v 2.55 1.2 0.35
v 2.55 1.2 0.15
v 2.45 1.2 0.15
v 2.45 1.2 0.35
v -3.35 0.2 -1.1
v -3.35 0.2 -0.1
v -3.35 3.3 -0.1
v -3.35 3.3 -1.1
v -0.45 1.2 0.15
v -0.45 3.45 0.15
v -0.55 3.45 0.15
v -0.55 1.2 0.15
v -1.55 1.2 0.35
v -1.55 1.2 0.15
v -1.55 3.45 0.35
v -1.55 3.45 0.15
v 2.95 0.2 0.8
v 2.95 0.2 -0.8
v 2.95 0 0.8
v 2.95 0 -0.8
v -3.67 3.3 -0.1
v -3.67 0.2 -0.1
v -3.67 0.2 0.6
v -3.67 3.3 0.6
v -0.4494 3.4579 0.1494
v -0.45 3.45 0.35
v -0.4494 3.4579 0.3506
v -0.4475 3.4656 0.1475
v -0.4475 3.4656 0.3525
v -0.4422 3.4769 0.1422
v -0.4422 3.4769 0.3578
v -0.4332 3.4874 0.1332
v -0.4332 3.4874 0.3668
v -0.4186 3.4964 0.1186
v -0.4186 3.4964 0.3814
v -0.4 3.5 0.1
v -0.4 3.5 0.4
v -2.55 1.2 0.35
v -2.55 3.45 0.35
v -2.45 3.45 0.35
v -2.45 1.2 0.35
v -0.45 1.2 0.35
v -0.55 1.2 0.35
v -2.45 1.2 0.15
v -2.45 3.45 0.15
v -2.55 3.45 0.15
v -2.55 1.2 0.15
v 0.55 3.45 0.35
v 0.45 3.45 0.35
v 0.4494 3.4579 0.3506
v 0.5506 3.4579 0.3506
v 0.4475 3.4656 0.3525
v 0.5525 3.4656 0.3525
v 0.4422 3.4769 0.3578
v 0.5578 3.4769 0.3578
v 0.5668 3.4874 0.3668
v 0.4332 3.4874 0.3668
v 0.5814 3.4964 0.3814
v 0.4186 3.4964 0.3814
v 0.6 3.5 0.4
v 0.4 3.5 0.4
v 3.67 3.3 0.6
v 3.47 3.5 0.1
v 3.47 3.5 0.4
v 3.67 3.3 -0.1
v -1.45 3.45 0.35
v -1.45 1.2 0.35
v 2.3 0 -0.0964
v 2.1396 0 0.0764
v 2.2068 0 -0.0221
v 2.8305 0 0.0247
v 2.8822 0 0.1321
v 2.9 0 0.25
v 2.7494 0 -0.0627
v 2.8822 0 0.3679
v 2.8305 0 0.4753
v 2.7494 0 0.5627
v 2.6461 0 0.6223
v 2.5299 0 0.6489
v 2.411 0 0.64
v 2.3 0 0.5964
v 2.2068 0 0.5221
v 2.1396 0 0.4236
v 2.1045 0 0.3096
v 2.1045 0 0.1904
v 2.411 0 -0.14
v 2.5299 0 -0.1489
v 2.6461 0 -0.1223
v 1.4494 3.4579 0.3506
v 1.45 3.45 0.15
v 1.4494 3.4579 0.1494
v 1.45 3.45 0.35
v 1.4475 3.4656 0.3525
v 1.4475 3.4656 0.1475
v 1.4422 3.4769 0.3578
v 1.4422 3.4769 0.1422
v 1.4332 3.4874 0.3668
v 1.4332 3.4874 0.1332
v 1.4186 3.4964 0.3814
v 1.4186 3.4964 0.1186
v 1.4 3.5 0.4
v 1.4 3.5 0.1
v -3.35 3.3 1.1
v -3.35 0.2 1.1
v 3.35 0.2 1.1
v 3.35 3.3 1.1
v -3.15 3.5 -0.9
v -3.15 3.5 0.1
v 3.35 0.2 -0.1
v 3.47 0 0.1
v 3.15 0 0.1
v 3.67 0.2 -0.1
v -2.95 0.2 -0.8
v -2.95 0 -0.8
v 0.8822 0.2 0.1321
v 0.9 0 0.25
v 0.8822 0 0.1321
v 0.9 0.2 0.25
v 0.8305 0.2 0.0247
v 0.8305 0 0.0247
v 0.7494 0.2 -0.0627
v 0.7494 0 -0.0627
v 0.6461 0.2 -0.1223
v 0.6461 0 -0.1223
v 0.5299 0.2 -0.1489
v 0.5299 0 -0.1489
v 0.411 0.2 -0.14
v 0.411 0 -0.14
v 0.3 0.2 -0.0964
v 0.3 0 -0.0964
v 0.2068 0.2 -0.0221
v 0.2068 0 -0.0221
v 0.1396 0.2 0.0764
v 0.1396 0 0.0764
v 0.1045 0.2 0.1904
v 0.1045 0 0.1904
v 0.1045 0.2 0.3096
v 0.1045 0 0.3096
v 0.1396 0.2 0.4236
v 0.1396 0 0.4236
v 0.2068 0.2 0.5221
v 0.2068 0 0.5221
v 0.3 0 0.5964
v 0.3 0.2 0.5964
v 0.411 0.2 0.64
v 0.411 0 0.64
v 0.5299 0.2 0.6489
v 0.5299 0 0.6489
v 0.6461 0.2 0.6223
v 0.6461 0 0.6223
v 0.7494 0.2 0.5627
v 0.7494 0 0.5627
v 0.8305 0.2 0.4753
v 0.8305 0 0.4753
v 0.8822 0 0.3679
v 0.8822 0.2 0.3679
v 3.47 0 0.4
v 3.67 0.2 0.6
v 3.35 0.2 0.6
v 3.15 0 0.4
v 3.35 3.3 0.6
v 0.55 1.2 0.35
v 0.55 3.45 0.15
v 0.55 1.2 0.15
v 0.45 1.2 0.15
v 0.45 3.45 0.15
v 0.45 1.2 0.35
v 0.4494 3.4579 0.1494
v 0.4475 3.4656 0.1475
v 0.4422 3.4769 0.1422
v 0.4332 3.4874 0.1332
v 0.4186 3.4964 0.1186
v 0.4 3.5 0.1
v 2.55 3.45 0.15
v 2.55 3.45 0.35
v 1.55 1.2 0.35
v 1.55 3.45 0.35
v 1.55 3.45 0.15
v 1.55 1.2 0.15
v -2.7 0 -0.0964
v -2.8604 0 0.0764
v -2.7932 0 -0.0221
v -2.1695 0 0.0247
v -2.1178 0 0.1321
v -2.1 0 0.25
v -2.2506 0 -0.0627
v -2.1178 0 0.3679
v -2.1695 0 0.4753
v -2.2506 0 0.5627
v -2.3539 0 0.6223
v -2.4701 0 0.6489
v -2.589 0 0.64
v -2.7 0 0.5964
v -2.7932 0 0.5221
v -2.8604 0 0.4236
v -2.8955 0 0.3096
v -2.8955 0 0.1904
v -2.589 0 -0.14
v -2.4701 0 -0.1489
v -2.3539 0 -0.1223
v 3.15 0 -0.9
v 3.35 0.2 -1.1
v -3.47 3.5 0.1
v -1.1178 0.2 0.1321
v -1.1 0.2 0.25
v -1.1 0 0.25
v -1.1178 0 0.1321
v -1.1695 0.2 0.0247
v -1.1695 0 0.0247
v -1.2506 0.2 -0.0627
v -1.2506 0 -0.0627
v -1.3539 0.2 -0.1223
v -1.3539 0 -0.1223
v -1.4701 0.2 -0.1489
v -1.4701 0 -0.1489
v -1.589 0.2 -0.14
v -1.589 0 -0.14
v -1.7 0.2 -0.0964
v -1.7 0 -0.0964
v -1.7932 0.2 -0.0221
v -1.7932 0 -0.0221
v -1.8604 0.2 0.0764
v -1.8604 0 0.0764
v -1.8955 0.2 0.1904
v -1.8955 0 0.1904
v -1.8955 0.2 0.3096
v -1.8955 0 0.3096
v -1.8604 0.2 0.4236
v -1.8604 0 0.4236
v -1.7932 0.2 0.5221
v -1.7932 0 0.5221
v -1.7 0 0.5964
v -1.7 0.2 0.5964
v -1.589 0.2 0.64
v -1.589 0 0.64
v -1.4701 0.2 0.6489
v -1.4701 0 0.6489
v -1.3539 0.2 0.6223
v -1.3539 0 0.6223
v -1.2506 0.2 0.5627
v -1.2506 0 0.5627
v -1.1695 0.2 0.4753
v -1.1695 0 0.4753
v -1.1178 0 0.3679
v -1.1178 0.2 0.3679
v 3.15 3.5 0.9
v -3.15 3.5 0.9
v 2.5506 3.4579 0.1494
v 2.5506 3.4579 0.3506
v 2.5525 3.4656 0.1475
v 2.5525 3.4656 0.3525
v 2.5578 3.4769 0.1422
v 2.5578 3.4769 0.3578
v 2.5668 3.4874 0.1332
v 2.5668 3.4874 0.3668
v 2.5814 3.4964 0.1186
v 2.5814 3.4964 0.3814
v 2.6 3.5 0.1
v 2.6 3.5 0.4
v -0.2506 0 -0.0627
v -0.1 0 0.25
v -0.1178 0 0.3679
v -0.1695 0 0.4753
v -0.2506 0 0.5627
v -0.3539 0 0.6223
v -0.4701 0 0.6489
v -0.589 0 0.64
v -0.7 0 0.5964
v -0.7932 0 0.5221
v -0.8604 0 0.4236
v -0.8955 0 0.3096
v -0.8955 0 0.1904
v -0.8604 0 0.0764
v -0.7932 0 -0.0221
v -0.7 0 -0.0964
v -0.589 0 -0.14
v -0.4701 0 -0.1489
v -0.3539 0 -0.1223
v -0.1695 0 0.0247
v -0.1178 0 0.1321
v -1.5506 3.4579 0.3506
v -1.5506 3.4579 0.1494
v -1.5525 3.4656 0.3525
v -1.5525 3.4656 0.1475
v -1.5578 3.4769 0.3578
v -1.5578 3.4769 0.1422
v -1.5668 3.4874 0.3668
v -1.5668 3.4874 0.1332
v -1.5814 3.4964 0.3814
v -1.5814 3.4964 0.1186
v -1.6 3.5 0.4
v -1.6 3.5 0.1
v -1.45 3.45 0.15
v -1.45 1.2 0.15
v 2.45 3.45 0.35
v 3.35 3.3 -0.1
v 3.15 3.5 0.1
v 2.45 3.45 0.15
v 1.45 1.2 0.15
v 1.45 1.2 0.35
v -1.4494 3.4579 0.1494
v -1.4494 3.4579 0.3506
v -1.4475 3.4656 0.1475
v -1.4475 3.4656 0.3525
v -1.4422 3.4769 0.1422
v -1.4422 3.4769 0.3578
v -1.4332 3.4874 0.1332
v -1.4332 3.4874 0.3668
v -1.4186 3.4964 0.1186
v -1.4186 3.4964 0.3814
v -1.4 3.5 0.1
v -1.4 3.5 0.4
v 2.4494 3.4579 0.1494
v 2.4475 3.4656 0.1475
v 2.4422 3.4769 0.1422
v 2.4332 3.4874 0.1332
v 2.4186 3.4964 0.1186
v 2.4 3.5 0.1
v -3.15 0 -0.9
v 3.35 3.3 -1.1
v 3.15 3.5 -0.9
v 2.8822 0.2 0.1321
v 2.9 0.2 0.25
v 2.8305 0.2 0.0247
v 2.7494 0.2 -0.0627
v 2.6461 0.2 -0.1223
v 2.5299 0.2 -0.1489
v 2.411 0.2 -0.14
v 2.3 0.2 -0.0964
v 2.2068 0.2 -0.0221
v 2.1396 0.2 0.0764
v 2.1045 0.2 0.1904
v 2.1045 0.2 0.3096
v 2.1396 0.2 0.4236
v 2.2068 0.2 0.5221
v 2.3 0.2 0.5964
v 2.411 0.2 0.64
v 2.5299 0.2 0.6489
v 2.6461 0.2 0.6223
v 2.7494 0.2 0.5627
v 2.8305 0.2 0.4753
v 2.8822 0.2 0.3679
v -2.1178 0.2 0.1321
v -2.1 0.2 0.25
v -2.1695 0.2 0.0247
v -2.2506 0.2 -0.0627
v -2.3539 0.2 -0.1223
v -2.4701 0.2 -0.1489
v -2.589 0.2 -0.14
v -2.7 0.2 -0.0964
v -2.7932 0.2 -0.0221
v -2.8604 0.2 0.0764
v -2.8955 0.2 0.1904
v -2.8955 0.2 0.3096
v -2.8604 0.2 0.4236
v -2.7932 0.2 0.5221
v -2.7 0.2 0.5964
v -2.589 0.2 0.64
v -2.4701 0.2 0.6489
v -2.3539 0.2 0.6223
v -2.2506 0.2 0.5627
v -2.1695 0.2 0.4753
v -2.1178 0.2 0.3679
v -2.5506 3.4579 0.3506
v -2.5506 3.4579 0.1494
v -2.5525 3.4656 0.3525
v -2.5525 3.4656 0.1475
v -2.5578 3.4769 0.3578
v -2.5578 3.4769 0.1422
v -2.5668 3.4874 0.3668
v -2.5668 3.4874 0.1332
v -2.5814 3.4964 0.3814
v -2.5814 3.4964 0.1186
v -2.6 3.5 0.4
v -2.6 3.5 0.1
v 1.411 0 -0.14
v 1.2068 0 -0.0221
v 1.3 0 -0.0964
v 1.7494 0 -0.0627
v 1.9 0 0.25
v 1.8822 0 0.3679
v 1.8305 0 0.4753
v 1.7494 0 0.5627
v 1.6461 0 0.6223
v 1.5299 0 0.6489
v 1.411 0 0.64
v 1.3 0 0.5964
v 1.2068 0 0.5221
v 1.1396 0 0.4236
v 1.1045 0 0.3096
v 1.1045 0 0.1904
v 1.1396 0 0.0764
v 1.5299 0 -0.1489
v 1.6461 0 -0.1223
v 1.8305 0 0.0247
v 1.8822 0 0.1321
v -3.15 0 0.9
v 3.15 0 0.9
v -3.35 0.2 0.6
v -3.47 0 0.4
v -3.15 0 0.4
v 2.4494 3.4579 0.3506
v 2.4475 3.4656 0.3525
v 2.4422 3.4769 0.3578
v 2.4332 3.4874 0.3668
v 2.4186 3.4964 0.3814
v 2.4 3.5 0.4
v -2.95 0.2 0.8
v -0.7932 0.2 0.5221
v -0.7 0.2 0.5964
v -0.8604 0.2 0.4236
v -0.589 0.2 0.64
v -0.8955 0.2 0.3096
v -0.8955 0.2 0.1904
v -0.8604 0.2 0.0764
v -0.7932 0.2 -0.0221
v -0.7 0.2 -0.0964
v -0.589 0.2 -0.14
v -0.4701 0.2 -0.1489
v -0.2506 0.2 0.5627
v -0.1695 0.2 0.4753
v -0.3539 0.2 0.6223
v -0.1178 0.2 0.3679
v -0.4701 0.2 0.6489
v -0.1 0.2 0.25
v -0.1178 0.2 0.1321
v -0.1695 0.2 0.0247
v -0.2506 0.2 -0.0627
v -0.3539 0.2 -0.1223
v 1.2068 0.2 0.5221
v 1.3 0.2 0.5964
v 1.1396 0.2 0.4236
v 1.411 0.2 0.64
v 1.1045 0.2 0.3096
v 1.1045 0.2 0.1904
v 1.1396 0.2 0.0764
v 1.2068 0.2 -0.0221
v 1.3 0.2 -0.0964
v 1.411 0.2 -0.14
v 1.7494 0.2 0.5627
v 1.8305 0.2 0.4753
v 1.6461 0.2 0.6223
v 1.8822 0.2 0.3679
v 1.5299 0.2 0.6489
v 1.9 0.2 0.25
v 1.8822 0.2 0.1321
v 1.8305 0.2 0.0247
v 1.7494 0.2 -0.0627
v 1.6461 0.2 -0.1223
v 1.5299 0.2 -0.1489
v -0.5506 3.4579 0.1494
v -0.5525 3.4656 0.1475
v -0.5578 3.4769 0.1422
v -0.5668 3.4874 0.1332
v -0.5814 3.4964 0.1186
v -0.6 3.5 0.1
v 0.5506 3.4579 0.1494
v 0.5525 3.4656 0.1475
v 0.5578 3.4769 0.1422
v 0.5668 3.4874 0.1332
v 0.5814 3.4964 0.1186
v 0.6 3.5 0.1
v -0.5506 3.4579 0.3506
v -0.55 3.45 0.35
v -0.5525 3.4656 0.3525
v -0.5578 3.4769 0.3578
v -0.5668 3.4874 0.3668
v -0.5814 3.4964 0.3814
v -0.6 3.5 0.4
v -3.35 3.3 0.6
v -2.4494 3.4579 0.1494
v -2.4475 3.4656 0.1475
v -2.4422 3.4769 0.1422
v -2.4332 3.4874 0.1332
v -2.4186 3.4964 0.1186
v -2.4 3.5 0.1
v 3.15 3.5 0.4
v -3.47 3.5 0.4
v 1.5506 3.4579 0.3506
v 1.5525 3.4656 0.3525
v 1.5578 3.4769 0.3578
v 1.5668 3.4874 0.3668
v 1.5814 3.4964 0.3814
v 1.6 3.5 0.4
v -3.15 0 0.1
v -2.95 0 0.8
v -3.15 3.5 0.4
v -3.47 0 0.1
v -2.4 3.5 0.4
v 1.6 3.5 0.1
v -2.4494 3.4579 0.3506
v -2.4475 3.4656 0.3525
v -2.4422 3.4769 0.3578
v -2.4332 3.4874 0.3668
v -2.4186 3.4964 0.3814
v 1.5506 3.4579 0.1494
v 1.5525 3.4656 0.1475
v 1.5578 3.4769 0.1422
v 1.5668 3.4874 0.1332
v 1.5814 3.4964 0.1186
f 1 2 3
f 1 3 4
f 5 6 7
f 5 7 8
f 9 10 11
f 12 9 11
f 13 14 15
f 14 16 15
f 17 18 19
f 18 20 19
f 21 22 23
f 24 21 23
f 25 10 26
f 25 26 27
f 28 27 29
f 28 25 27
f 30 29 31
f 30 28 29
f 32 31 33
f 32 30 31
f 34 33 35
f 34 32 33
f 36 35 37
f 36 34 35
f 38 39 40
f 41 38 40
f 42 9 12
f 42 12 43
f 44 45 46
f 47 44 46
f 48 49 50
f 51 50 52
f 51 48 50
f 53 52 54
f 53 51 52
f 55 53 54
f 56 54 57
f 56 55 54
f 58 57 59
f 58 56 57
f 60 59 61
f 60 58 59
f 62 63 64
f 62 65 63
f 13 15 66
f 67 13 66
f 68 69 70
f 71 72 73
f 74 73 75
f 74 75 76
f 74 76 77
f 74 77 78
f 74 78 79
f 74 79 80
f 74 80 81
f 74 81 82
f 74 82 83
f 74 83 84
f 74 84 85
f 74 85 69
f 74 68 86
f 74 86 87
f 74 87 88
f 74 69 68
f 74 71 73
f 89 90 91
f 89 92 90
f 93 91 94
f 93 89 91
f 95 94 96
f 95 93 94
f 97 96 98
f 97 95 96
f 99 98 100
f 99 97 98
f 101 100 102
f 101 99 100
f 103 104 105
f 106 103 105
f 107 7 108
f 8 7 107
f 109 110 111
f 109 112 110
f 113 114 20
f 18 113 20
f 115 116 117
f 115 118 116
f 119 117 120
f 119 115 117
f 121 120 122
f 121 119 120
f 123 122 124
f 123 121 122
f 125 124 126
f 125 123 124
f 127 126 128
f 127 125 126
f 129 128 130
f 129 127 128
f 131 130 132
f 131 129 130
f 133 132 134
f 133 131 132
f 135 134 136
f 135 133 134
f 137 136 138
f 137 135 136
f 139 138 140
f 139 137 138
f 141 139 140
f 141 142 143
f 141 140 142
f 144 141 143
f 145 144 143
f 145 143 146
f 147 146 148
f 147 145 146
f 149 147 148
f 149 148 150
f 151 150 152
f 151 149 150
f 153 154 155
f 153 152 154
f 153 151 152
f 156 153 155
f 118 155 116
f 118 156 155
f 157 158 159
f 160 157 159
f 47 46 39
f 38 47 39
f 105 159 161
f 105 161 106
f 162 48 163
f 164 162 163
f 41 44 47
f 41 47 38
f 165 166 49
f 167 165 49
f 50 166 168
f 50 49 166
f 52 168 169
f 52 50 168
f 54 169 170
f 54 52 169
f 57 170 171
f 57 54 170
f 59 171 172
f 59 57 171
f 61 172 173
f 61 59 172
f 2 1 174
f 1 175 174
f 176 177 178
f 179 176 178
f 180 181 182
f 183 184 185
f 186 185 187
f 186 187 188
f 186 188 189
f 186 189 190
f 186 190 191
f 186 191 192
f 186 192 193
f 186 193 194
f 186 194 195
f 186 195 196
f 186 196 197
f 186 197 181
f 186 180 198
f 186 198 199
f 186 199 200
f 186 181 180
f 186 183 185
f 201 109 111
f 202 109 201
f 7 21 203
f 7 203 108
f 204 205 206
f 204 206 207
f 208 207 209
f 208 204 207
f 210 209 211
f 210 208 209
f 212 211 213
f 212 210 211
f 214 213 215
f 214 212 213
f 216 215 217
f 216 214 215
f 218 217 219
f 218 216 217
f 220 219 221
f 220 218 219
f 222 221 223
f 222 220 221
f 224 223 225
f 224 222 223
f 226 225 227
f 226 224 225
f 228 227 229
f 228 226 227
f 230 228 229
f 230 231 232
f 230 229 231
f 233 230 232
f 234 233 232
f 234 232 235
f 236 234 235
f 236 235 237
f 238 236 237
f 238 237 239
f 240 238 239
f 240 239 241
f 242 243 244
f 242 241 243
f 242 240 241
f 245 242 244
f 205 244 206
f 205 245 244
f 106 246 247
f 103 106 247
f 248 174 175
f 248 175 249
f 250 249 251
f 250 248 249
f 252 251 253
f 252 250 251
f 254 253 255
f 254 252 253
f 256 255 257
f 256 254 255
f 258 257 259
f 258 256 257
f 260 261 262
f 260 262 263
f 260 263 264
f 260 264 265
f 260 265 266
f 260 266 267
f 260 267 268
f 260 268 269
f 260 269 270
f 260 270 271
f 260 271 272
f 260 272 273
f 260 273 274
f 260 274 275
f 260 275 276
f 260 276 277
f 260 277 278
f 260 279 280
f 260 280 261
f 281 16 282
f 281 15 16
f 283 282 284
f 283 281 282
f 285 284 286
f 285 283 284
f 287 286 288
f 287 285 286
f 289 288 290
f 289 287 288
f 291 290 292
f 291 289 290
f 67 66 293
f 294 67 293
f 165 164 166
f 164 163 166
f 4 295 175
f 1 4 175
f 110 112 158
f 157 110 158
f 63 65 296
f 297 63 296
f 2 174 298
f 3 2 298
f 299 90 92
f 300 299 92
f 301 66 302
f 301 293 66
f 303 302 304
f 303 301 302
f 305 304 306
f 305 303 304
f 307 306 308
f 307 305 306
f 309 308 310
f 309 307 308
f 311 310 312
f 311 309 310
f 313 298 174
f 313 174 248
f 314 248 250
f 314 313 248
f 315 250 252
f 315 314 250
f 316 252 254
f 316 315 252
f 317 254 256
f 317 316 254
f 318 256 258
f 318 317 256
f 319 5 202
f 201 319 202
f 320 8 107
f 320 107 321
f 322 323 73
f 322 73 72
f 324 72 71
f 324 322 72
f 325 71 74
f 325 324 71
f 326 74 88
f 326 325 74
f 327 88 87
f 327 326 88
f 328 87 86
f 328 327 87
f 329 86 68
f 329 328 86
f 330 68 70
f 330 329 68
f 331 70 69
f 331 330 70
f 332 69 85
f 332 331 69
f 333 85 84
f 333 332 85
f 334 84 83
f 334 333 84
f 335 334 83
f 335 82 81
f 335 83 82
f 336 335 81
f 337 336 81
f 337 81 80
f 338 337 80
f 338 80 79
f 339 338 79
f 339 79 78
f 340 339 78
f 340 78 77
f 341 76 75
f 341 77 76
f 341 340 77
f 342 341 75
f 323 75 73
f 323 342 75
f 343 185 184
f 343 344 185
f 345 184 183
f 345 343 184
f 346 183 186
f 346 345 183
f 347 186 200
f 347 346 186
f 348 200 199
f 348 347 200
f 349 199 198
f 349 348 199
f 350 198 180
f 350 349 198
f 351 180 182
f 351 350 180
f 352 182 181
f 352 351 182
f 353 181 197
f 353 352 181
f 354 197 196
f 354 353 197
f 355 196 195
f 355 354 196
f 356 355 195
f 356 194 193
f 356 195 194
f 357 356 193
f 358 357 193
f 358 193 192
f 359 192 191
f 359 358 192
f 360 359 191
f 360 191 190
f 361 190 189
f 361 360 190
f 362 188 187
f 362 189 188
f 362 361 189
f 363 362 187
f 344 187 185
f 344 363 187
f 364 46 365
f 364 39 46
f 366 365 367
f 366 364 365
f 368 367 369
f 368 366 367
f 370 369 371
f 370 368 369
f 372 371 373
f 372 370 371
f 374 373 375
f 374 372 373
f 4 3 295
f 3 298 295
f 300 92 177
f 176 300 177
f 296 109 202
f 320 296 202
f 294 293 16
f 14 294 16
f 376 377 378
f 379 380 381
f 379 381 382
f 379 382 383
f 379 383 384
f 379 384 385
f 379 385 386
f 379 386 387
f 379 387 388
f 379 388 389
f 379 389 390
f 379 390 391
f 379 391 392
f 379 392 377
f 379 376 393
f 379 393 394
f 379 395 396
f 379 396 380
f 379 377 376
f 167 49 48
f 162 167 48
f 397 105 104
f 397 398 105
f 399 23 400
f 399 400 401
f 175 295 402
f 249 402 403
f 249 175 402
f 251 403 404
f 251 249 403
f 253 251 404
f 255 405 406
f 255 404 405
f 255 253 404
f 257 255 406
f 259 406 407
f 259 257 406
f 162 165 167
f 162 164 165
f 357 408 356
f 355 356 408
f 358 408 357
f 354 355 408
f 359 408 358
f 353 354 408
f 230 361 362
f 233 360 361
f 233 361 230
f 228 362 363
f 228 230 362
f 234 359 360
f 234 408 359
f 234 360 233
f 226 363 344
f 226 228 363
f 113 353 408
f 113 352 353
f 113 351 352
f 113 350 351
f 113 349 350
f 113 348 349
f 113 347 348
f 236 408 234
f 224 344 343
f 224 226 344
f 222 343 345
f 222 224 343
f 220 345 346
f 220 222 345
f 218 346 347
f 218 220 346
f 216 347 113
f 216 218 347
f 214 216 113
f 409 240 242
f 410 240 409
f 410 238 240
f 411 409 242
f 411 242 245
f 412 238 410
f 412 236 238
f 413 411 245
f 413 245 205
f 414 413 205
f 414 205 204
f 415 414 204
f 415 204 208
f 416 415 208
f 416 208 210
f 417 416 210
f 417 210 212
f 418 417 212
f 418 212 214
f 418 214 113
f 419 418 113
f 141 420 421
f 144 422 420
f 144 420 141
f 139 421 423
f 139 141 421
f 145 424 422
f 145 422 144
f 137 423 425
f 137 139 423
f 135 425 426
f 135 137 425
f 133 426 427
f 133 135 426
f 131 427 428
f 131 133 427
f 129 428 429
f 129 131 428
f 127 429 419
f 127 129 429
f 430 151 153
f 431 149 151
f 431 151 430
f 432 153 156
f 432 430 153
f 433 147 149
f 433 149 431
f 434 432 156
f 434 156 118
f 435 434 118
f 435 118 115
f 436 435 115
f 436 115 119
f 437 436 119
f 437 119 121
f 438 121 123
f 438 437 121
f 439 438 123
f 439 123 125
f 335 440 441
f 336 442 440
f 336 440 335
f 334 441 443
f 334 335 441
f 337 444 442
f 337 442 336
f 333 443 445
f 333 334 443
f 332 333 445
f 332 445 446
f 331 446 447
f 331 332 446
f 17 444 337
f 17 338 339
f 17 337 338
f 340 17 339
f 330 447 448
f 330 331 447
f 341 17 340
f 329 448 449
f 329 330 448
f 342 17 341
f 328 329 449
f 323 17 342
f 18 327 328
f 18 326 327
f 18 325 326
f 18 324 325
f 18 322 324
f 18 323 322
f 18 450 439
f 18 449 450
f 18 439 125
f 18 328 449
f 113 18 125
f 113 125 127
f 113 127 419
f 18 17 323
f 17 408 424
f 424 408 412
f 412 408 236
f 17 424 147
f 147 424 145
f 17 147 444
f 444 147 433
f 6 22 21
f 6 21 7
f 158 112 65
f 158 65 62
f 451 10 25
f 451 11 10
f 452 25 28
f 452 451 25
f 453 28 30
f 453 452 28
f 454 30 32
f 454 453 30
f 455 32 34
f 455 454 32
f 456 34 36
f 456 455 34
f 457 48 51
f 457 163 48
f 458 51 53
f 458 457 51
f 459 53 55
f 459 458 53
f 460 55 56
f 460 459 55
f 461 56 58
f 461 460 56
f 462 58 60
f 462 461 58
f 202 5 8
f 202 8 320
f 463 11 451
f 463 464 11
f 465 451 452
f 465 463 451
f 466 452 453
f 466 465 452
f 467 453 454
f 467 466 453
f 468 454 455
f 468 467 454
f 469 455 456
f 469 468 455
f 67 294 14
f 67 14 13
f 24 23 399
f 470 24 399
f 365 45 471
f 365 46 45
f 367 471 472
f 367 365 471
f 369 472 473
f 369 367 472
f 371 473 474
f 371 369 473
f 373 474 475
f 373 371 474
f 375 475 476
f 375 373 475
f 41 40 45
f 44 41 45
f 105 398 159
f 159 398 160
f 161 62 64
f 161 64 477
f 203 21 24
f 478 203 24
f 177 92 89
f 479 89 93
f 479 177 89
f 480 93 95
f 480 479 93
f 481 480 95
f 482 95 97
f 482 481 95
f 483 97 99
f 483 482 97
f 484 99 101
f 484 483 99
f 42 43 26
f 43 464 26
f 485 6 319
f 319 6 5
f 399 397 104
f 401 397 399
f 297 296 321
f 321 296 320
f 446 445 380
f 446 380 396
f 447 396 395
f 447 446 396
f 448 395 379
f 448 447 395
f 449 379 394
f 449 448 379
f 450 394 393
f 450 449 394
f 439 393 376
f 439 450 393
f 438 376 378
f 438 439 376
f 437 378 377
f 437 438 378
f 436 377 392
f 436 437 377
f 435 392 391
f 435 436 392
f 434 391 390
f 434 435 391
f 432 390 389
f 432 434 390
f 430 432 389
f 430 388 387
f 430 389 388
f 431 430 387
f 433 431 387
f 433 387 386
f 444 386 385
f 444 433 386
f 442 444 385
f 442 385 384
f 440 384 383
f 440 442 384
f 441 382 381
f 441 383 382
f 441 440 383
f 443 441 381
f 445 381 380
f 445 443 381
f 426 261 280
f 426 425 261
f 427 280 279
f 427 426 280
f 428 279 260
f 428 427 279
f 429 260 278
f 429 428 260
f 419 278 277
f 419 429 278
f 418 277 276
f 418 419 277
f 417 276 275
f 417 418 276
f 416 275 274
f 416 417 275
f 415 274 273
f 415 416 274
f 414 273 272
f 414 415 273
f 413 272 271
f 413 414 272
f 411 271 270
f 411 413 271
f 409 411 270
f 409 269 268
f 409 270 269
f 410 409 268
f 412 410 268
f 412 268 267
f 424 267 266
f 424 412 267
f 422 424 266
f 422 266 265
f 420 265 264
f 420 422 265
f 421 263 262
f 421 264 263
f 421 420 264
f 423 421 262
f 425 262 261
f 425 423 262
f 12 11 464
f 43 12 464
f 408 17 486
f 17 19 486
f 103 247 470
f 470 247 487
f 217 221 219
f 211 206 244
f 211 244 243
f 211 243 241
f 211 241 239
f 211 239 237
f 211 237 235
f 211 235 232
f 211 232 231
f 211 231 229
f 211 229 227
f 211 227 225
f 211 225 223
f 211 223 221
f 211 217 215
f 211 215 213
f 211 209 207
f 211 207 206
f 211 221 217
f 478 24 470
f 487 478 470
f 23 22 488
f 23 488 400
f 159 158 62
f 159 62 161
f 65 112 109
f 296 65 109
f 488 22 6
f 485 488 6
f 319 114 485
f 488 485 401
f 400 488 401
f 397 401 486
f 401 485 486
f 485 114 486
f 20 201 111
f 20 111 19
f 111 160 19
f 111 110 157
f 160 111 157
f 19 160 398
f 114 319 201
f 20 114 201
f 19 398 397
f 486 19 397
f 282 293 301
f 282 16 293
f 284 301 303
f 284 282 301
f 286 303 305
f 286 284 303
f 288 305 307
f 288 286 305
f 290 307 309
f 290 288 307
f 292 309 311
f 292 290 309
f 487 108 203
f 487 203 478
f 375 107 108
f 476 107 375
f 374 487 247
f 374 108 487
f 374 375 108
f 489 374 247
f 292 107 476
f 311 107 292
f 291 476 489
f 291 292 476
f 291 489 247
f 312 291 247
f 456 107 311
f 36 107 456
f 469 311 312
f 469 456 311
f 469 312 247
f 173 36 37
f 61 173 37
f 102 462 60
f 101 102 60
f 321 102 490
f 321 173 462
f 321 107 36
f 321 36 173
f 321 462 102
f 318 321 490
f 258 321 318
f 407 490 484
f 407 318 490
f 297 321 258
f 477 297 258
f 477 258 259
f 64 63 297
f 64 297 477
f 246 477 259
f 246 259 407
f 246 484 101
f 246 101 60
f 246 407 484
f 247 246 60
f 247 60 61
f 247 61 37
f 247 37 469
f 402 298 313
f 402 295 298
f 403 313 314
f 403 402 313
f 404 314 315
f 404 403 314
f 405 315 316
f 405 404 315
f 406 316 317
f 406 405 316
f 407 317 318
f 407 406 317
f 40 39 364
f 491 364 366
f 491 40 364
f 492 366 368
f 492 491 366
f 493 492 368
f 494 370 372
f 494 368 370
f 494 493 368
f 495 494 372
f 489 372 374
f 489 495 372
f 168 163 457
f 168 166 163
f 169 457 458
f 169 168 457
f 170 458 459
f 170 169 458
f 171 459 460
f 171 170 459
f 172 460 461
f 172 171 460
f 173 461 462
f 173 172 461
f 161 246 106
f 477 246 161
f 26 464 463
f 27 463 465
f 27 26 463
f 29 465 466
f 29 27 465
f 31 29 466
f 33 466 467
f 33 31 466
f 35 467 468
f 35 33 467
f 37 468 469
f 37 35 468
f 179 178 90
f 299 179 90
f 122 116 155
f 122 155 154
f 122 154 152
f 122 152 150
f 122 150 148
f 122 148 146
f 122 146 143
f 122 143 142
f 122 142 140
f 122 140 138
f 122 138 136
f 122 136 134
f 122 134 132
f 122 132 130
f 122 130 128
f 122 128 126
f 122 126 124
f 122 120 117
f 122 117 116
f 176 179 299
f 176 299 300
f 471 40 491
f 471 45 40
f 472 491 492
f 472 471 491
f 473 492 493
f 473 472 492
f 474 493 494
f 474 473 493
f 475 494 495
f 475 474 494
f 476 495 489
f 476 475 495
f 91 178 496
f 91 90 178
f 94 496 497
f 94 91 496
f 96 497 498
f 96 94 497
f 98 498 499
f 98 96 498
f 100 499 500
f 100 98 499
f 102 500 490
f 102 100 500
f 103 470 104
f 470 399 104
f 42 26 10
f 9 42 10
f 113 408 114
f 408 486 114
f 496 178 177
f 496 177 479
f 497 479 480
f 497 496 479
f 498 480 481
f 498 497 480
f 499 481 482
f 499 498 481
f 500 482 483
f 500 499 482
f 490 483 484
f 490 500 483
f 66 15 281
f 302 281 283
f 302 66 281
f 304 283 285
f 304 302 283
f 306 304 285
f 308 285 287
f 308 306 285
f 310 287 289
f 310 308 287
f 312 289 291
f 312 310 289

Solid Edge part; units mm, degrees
sketch "Sketch1" plane through (0, 0, 0) normal (0, -1, 0) x (1, 0, 0)
  line L0 (-3.35, 1.1) -> (3.35, 1.1)
  line L1 (3.35, 0.6) -> (3.35, 1.1)
  line L2 (3.67, 0.6) -> (3.35, 0.6)
  line L3 (3.67, 0.25) -> (3.67, 0.6)
  line L4 (3.67, 0.25) -> (3.67, -0.1)
  line L5 (3.67, -0.1) -> (3.35, -0.1)
  line L6 (3.35, -0.1) -> (3.35, -1.1)
  line L7 (-3.35, -1.1) -> (3.35, -1.1)
  line L8 (-3.35, -0.1) -> (-3.35, -1.1)
  line L9 (-3.67, -0.1) -> (-3.35, -0.1)
  line L10 (-3.67, 0.25) -> (-3.67, -0.1)
  line L11 (-3.67, 0.25) -> (-3.67, 0.6)
  line L12 (-3.67, 0.6) -> (-3.35, 0.6)
  line L13 (-3.35, 0.6) -> (-3.35, 1.1)
extrude "Protrusion1" add sketch "Sketch1" against normal blind 3.5
sketch "Sketch2" plane through (0, 0, 0) normal (0, -1, 0) x (1, 0, 0)
  line L0 (2.95, 0.8) -> (-2.95, 0.8)
  line L1 (-2.95, 0.8) -> (-2.95, -0.8)
  line L2 (-2.95, -0.8) -> (2.95, -0.8)
  line L3 (2.95, -0.8) -> (2.95, 0.8)
extrude "BackSide_Hole_Cutout" cut sketch "Sketch2" against normal blind 0.2
sketch "Sketch3" plane through (0, 3.5, 0) normal (0, 1, 0) x (-1, 0, 0)
  line L0 (-2.45, 0.15) -> (-2.45, 0.35)
  line L1 (-2.45, 0.35) -> (-2.55, 0.35)
  line L2 (-2.55, 0.35) -> (-2.55, 0.15)
  line L3 (-2.55, 0.15) -> (-2.45, 0.15)
extrude "Pin_Cutout_Instance" cut sketch "Sketch3" against normal blind 2.3
chamfer "Chamfered_Edges" distance 0.2 angle 45 24 edges at (3.67, 3.5, 0.25) (-3.67, 3.5, 0.25) (-3.35, 3.5, 0.85) (3.35, 3.5, 0.85) (3.35, 3.5, -0.6) (0, 3.5, -1.1) (0, 3.5, 1.1) (3.51, 3.5, 0.6) (3.51, 3.5, -0.1) (-3.35, 3.5, -0.6) (-3.51, 3.5, -0.1) (-3.51, 3.5, 0.6) (3.35, 0, -0.6) (3.67, 0, 0.25) (3.35, 0, 0.85) (-3.35, 0, -0.6) (-3.67, 0, 0.25) (-3.35, 0, 0.85) (-3.51, 0, -0.1) (-3.51, 0, 0.6) (3.51, 0, 0.6) (3.51, 0, -0.1) (0, 0, 1.1) (0, 0, -1.1)
fillet "Round_Edges_Pin_Hole" radius 0.05 4 edges at (2.5, 3.5, 0.15) (2.45, 3.5, 0.25) (2.55, 3.5, 0.25) (2.5, 3.5, 0.35)
pattern_linear "Pattern1" count 6 spacing 1 along (-1, 0, 0) of "Pin_Cutout_Instance", "Round_Edges_Pin_Hole"
sketch "Sketch4" plane through (0, 0.2, 0) normal (0, -1, 0) x (1, 0, 0)
  circle A0 centre (-2.5, 0.25) radius 0.4
  circle A1 centre (-1.5, 0.25) radius 0.4
  circle A2 centre (-0.5, 0.25) radius 0.4
  circle A3 centre (0.5, 0.25) radius 0.4
  circle A4 centre (1.5, 0.25) radius 0.4
  circle A5 centre (2.5, 0.25) radius 0.4
  dimension "D1" = 0.8
  dimension "D2" = 0.8
  dimension "D3" = 0.8
  dimension "D4" = 0.8
  dimension "D5" = 0.8
  dimension "D6" = 0.8
extrude "Cable_Endings_Protruded" add sketch "Sketch4" along normal blind 0.2
properties material "ABS Plastic, high impact"
